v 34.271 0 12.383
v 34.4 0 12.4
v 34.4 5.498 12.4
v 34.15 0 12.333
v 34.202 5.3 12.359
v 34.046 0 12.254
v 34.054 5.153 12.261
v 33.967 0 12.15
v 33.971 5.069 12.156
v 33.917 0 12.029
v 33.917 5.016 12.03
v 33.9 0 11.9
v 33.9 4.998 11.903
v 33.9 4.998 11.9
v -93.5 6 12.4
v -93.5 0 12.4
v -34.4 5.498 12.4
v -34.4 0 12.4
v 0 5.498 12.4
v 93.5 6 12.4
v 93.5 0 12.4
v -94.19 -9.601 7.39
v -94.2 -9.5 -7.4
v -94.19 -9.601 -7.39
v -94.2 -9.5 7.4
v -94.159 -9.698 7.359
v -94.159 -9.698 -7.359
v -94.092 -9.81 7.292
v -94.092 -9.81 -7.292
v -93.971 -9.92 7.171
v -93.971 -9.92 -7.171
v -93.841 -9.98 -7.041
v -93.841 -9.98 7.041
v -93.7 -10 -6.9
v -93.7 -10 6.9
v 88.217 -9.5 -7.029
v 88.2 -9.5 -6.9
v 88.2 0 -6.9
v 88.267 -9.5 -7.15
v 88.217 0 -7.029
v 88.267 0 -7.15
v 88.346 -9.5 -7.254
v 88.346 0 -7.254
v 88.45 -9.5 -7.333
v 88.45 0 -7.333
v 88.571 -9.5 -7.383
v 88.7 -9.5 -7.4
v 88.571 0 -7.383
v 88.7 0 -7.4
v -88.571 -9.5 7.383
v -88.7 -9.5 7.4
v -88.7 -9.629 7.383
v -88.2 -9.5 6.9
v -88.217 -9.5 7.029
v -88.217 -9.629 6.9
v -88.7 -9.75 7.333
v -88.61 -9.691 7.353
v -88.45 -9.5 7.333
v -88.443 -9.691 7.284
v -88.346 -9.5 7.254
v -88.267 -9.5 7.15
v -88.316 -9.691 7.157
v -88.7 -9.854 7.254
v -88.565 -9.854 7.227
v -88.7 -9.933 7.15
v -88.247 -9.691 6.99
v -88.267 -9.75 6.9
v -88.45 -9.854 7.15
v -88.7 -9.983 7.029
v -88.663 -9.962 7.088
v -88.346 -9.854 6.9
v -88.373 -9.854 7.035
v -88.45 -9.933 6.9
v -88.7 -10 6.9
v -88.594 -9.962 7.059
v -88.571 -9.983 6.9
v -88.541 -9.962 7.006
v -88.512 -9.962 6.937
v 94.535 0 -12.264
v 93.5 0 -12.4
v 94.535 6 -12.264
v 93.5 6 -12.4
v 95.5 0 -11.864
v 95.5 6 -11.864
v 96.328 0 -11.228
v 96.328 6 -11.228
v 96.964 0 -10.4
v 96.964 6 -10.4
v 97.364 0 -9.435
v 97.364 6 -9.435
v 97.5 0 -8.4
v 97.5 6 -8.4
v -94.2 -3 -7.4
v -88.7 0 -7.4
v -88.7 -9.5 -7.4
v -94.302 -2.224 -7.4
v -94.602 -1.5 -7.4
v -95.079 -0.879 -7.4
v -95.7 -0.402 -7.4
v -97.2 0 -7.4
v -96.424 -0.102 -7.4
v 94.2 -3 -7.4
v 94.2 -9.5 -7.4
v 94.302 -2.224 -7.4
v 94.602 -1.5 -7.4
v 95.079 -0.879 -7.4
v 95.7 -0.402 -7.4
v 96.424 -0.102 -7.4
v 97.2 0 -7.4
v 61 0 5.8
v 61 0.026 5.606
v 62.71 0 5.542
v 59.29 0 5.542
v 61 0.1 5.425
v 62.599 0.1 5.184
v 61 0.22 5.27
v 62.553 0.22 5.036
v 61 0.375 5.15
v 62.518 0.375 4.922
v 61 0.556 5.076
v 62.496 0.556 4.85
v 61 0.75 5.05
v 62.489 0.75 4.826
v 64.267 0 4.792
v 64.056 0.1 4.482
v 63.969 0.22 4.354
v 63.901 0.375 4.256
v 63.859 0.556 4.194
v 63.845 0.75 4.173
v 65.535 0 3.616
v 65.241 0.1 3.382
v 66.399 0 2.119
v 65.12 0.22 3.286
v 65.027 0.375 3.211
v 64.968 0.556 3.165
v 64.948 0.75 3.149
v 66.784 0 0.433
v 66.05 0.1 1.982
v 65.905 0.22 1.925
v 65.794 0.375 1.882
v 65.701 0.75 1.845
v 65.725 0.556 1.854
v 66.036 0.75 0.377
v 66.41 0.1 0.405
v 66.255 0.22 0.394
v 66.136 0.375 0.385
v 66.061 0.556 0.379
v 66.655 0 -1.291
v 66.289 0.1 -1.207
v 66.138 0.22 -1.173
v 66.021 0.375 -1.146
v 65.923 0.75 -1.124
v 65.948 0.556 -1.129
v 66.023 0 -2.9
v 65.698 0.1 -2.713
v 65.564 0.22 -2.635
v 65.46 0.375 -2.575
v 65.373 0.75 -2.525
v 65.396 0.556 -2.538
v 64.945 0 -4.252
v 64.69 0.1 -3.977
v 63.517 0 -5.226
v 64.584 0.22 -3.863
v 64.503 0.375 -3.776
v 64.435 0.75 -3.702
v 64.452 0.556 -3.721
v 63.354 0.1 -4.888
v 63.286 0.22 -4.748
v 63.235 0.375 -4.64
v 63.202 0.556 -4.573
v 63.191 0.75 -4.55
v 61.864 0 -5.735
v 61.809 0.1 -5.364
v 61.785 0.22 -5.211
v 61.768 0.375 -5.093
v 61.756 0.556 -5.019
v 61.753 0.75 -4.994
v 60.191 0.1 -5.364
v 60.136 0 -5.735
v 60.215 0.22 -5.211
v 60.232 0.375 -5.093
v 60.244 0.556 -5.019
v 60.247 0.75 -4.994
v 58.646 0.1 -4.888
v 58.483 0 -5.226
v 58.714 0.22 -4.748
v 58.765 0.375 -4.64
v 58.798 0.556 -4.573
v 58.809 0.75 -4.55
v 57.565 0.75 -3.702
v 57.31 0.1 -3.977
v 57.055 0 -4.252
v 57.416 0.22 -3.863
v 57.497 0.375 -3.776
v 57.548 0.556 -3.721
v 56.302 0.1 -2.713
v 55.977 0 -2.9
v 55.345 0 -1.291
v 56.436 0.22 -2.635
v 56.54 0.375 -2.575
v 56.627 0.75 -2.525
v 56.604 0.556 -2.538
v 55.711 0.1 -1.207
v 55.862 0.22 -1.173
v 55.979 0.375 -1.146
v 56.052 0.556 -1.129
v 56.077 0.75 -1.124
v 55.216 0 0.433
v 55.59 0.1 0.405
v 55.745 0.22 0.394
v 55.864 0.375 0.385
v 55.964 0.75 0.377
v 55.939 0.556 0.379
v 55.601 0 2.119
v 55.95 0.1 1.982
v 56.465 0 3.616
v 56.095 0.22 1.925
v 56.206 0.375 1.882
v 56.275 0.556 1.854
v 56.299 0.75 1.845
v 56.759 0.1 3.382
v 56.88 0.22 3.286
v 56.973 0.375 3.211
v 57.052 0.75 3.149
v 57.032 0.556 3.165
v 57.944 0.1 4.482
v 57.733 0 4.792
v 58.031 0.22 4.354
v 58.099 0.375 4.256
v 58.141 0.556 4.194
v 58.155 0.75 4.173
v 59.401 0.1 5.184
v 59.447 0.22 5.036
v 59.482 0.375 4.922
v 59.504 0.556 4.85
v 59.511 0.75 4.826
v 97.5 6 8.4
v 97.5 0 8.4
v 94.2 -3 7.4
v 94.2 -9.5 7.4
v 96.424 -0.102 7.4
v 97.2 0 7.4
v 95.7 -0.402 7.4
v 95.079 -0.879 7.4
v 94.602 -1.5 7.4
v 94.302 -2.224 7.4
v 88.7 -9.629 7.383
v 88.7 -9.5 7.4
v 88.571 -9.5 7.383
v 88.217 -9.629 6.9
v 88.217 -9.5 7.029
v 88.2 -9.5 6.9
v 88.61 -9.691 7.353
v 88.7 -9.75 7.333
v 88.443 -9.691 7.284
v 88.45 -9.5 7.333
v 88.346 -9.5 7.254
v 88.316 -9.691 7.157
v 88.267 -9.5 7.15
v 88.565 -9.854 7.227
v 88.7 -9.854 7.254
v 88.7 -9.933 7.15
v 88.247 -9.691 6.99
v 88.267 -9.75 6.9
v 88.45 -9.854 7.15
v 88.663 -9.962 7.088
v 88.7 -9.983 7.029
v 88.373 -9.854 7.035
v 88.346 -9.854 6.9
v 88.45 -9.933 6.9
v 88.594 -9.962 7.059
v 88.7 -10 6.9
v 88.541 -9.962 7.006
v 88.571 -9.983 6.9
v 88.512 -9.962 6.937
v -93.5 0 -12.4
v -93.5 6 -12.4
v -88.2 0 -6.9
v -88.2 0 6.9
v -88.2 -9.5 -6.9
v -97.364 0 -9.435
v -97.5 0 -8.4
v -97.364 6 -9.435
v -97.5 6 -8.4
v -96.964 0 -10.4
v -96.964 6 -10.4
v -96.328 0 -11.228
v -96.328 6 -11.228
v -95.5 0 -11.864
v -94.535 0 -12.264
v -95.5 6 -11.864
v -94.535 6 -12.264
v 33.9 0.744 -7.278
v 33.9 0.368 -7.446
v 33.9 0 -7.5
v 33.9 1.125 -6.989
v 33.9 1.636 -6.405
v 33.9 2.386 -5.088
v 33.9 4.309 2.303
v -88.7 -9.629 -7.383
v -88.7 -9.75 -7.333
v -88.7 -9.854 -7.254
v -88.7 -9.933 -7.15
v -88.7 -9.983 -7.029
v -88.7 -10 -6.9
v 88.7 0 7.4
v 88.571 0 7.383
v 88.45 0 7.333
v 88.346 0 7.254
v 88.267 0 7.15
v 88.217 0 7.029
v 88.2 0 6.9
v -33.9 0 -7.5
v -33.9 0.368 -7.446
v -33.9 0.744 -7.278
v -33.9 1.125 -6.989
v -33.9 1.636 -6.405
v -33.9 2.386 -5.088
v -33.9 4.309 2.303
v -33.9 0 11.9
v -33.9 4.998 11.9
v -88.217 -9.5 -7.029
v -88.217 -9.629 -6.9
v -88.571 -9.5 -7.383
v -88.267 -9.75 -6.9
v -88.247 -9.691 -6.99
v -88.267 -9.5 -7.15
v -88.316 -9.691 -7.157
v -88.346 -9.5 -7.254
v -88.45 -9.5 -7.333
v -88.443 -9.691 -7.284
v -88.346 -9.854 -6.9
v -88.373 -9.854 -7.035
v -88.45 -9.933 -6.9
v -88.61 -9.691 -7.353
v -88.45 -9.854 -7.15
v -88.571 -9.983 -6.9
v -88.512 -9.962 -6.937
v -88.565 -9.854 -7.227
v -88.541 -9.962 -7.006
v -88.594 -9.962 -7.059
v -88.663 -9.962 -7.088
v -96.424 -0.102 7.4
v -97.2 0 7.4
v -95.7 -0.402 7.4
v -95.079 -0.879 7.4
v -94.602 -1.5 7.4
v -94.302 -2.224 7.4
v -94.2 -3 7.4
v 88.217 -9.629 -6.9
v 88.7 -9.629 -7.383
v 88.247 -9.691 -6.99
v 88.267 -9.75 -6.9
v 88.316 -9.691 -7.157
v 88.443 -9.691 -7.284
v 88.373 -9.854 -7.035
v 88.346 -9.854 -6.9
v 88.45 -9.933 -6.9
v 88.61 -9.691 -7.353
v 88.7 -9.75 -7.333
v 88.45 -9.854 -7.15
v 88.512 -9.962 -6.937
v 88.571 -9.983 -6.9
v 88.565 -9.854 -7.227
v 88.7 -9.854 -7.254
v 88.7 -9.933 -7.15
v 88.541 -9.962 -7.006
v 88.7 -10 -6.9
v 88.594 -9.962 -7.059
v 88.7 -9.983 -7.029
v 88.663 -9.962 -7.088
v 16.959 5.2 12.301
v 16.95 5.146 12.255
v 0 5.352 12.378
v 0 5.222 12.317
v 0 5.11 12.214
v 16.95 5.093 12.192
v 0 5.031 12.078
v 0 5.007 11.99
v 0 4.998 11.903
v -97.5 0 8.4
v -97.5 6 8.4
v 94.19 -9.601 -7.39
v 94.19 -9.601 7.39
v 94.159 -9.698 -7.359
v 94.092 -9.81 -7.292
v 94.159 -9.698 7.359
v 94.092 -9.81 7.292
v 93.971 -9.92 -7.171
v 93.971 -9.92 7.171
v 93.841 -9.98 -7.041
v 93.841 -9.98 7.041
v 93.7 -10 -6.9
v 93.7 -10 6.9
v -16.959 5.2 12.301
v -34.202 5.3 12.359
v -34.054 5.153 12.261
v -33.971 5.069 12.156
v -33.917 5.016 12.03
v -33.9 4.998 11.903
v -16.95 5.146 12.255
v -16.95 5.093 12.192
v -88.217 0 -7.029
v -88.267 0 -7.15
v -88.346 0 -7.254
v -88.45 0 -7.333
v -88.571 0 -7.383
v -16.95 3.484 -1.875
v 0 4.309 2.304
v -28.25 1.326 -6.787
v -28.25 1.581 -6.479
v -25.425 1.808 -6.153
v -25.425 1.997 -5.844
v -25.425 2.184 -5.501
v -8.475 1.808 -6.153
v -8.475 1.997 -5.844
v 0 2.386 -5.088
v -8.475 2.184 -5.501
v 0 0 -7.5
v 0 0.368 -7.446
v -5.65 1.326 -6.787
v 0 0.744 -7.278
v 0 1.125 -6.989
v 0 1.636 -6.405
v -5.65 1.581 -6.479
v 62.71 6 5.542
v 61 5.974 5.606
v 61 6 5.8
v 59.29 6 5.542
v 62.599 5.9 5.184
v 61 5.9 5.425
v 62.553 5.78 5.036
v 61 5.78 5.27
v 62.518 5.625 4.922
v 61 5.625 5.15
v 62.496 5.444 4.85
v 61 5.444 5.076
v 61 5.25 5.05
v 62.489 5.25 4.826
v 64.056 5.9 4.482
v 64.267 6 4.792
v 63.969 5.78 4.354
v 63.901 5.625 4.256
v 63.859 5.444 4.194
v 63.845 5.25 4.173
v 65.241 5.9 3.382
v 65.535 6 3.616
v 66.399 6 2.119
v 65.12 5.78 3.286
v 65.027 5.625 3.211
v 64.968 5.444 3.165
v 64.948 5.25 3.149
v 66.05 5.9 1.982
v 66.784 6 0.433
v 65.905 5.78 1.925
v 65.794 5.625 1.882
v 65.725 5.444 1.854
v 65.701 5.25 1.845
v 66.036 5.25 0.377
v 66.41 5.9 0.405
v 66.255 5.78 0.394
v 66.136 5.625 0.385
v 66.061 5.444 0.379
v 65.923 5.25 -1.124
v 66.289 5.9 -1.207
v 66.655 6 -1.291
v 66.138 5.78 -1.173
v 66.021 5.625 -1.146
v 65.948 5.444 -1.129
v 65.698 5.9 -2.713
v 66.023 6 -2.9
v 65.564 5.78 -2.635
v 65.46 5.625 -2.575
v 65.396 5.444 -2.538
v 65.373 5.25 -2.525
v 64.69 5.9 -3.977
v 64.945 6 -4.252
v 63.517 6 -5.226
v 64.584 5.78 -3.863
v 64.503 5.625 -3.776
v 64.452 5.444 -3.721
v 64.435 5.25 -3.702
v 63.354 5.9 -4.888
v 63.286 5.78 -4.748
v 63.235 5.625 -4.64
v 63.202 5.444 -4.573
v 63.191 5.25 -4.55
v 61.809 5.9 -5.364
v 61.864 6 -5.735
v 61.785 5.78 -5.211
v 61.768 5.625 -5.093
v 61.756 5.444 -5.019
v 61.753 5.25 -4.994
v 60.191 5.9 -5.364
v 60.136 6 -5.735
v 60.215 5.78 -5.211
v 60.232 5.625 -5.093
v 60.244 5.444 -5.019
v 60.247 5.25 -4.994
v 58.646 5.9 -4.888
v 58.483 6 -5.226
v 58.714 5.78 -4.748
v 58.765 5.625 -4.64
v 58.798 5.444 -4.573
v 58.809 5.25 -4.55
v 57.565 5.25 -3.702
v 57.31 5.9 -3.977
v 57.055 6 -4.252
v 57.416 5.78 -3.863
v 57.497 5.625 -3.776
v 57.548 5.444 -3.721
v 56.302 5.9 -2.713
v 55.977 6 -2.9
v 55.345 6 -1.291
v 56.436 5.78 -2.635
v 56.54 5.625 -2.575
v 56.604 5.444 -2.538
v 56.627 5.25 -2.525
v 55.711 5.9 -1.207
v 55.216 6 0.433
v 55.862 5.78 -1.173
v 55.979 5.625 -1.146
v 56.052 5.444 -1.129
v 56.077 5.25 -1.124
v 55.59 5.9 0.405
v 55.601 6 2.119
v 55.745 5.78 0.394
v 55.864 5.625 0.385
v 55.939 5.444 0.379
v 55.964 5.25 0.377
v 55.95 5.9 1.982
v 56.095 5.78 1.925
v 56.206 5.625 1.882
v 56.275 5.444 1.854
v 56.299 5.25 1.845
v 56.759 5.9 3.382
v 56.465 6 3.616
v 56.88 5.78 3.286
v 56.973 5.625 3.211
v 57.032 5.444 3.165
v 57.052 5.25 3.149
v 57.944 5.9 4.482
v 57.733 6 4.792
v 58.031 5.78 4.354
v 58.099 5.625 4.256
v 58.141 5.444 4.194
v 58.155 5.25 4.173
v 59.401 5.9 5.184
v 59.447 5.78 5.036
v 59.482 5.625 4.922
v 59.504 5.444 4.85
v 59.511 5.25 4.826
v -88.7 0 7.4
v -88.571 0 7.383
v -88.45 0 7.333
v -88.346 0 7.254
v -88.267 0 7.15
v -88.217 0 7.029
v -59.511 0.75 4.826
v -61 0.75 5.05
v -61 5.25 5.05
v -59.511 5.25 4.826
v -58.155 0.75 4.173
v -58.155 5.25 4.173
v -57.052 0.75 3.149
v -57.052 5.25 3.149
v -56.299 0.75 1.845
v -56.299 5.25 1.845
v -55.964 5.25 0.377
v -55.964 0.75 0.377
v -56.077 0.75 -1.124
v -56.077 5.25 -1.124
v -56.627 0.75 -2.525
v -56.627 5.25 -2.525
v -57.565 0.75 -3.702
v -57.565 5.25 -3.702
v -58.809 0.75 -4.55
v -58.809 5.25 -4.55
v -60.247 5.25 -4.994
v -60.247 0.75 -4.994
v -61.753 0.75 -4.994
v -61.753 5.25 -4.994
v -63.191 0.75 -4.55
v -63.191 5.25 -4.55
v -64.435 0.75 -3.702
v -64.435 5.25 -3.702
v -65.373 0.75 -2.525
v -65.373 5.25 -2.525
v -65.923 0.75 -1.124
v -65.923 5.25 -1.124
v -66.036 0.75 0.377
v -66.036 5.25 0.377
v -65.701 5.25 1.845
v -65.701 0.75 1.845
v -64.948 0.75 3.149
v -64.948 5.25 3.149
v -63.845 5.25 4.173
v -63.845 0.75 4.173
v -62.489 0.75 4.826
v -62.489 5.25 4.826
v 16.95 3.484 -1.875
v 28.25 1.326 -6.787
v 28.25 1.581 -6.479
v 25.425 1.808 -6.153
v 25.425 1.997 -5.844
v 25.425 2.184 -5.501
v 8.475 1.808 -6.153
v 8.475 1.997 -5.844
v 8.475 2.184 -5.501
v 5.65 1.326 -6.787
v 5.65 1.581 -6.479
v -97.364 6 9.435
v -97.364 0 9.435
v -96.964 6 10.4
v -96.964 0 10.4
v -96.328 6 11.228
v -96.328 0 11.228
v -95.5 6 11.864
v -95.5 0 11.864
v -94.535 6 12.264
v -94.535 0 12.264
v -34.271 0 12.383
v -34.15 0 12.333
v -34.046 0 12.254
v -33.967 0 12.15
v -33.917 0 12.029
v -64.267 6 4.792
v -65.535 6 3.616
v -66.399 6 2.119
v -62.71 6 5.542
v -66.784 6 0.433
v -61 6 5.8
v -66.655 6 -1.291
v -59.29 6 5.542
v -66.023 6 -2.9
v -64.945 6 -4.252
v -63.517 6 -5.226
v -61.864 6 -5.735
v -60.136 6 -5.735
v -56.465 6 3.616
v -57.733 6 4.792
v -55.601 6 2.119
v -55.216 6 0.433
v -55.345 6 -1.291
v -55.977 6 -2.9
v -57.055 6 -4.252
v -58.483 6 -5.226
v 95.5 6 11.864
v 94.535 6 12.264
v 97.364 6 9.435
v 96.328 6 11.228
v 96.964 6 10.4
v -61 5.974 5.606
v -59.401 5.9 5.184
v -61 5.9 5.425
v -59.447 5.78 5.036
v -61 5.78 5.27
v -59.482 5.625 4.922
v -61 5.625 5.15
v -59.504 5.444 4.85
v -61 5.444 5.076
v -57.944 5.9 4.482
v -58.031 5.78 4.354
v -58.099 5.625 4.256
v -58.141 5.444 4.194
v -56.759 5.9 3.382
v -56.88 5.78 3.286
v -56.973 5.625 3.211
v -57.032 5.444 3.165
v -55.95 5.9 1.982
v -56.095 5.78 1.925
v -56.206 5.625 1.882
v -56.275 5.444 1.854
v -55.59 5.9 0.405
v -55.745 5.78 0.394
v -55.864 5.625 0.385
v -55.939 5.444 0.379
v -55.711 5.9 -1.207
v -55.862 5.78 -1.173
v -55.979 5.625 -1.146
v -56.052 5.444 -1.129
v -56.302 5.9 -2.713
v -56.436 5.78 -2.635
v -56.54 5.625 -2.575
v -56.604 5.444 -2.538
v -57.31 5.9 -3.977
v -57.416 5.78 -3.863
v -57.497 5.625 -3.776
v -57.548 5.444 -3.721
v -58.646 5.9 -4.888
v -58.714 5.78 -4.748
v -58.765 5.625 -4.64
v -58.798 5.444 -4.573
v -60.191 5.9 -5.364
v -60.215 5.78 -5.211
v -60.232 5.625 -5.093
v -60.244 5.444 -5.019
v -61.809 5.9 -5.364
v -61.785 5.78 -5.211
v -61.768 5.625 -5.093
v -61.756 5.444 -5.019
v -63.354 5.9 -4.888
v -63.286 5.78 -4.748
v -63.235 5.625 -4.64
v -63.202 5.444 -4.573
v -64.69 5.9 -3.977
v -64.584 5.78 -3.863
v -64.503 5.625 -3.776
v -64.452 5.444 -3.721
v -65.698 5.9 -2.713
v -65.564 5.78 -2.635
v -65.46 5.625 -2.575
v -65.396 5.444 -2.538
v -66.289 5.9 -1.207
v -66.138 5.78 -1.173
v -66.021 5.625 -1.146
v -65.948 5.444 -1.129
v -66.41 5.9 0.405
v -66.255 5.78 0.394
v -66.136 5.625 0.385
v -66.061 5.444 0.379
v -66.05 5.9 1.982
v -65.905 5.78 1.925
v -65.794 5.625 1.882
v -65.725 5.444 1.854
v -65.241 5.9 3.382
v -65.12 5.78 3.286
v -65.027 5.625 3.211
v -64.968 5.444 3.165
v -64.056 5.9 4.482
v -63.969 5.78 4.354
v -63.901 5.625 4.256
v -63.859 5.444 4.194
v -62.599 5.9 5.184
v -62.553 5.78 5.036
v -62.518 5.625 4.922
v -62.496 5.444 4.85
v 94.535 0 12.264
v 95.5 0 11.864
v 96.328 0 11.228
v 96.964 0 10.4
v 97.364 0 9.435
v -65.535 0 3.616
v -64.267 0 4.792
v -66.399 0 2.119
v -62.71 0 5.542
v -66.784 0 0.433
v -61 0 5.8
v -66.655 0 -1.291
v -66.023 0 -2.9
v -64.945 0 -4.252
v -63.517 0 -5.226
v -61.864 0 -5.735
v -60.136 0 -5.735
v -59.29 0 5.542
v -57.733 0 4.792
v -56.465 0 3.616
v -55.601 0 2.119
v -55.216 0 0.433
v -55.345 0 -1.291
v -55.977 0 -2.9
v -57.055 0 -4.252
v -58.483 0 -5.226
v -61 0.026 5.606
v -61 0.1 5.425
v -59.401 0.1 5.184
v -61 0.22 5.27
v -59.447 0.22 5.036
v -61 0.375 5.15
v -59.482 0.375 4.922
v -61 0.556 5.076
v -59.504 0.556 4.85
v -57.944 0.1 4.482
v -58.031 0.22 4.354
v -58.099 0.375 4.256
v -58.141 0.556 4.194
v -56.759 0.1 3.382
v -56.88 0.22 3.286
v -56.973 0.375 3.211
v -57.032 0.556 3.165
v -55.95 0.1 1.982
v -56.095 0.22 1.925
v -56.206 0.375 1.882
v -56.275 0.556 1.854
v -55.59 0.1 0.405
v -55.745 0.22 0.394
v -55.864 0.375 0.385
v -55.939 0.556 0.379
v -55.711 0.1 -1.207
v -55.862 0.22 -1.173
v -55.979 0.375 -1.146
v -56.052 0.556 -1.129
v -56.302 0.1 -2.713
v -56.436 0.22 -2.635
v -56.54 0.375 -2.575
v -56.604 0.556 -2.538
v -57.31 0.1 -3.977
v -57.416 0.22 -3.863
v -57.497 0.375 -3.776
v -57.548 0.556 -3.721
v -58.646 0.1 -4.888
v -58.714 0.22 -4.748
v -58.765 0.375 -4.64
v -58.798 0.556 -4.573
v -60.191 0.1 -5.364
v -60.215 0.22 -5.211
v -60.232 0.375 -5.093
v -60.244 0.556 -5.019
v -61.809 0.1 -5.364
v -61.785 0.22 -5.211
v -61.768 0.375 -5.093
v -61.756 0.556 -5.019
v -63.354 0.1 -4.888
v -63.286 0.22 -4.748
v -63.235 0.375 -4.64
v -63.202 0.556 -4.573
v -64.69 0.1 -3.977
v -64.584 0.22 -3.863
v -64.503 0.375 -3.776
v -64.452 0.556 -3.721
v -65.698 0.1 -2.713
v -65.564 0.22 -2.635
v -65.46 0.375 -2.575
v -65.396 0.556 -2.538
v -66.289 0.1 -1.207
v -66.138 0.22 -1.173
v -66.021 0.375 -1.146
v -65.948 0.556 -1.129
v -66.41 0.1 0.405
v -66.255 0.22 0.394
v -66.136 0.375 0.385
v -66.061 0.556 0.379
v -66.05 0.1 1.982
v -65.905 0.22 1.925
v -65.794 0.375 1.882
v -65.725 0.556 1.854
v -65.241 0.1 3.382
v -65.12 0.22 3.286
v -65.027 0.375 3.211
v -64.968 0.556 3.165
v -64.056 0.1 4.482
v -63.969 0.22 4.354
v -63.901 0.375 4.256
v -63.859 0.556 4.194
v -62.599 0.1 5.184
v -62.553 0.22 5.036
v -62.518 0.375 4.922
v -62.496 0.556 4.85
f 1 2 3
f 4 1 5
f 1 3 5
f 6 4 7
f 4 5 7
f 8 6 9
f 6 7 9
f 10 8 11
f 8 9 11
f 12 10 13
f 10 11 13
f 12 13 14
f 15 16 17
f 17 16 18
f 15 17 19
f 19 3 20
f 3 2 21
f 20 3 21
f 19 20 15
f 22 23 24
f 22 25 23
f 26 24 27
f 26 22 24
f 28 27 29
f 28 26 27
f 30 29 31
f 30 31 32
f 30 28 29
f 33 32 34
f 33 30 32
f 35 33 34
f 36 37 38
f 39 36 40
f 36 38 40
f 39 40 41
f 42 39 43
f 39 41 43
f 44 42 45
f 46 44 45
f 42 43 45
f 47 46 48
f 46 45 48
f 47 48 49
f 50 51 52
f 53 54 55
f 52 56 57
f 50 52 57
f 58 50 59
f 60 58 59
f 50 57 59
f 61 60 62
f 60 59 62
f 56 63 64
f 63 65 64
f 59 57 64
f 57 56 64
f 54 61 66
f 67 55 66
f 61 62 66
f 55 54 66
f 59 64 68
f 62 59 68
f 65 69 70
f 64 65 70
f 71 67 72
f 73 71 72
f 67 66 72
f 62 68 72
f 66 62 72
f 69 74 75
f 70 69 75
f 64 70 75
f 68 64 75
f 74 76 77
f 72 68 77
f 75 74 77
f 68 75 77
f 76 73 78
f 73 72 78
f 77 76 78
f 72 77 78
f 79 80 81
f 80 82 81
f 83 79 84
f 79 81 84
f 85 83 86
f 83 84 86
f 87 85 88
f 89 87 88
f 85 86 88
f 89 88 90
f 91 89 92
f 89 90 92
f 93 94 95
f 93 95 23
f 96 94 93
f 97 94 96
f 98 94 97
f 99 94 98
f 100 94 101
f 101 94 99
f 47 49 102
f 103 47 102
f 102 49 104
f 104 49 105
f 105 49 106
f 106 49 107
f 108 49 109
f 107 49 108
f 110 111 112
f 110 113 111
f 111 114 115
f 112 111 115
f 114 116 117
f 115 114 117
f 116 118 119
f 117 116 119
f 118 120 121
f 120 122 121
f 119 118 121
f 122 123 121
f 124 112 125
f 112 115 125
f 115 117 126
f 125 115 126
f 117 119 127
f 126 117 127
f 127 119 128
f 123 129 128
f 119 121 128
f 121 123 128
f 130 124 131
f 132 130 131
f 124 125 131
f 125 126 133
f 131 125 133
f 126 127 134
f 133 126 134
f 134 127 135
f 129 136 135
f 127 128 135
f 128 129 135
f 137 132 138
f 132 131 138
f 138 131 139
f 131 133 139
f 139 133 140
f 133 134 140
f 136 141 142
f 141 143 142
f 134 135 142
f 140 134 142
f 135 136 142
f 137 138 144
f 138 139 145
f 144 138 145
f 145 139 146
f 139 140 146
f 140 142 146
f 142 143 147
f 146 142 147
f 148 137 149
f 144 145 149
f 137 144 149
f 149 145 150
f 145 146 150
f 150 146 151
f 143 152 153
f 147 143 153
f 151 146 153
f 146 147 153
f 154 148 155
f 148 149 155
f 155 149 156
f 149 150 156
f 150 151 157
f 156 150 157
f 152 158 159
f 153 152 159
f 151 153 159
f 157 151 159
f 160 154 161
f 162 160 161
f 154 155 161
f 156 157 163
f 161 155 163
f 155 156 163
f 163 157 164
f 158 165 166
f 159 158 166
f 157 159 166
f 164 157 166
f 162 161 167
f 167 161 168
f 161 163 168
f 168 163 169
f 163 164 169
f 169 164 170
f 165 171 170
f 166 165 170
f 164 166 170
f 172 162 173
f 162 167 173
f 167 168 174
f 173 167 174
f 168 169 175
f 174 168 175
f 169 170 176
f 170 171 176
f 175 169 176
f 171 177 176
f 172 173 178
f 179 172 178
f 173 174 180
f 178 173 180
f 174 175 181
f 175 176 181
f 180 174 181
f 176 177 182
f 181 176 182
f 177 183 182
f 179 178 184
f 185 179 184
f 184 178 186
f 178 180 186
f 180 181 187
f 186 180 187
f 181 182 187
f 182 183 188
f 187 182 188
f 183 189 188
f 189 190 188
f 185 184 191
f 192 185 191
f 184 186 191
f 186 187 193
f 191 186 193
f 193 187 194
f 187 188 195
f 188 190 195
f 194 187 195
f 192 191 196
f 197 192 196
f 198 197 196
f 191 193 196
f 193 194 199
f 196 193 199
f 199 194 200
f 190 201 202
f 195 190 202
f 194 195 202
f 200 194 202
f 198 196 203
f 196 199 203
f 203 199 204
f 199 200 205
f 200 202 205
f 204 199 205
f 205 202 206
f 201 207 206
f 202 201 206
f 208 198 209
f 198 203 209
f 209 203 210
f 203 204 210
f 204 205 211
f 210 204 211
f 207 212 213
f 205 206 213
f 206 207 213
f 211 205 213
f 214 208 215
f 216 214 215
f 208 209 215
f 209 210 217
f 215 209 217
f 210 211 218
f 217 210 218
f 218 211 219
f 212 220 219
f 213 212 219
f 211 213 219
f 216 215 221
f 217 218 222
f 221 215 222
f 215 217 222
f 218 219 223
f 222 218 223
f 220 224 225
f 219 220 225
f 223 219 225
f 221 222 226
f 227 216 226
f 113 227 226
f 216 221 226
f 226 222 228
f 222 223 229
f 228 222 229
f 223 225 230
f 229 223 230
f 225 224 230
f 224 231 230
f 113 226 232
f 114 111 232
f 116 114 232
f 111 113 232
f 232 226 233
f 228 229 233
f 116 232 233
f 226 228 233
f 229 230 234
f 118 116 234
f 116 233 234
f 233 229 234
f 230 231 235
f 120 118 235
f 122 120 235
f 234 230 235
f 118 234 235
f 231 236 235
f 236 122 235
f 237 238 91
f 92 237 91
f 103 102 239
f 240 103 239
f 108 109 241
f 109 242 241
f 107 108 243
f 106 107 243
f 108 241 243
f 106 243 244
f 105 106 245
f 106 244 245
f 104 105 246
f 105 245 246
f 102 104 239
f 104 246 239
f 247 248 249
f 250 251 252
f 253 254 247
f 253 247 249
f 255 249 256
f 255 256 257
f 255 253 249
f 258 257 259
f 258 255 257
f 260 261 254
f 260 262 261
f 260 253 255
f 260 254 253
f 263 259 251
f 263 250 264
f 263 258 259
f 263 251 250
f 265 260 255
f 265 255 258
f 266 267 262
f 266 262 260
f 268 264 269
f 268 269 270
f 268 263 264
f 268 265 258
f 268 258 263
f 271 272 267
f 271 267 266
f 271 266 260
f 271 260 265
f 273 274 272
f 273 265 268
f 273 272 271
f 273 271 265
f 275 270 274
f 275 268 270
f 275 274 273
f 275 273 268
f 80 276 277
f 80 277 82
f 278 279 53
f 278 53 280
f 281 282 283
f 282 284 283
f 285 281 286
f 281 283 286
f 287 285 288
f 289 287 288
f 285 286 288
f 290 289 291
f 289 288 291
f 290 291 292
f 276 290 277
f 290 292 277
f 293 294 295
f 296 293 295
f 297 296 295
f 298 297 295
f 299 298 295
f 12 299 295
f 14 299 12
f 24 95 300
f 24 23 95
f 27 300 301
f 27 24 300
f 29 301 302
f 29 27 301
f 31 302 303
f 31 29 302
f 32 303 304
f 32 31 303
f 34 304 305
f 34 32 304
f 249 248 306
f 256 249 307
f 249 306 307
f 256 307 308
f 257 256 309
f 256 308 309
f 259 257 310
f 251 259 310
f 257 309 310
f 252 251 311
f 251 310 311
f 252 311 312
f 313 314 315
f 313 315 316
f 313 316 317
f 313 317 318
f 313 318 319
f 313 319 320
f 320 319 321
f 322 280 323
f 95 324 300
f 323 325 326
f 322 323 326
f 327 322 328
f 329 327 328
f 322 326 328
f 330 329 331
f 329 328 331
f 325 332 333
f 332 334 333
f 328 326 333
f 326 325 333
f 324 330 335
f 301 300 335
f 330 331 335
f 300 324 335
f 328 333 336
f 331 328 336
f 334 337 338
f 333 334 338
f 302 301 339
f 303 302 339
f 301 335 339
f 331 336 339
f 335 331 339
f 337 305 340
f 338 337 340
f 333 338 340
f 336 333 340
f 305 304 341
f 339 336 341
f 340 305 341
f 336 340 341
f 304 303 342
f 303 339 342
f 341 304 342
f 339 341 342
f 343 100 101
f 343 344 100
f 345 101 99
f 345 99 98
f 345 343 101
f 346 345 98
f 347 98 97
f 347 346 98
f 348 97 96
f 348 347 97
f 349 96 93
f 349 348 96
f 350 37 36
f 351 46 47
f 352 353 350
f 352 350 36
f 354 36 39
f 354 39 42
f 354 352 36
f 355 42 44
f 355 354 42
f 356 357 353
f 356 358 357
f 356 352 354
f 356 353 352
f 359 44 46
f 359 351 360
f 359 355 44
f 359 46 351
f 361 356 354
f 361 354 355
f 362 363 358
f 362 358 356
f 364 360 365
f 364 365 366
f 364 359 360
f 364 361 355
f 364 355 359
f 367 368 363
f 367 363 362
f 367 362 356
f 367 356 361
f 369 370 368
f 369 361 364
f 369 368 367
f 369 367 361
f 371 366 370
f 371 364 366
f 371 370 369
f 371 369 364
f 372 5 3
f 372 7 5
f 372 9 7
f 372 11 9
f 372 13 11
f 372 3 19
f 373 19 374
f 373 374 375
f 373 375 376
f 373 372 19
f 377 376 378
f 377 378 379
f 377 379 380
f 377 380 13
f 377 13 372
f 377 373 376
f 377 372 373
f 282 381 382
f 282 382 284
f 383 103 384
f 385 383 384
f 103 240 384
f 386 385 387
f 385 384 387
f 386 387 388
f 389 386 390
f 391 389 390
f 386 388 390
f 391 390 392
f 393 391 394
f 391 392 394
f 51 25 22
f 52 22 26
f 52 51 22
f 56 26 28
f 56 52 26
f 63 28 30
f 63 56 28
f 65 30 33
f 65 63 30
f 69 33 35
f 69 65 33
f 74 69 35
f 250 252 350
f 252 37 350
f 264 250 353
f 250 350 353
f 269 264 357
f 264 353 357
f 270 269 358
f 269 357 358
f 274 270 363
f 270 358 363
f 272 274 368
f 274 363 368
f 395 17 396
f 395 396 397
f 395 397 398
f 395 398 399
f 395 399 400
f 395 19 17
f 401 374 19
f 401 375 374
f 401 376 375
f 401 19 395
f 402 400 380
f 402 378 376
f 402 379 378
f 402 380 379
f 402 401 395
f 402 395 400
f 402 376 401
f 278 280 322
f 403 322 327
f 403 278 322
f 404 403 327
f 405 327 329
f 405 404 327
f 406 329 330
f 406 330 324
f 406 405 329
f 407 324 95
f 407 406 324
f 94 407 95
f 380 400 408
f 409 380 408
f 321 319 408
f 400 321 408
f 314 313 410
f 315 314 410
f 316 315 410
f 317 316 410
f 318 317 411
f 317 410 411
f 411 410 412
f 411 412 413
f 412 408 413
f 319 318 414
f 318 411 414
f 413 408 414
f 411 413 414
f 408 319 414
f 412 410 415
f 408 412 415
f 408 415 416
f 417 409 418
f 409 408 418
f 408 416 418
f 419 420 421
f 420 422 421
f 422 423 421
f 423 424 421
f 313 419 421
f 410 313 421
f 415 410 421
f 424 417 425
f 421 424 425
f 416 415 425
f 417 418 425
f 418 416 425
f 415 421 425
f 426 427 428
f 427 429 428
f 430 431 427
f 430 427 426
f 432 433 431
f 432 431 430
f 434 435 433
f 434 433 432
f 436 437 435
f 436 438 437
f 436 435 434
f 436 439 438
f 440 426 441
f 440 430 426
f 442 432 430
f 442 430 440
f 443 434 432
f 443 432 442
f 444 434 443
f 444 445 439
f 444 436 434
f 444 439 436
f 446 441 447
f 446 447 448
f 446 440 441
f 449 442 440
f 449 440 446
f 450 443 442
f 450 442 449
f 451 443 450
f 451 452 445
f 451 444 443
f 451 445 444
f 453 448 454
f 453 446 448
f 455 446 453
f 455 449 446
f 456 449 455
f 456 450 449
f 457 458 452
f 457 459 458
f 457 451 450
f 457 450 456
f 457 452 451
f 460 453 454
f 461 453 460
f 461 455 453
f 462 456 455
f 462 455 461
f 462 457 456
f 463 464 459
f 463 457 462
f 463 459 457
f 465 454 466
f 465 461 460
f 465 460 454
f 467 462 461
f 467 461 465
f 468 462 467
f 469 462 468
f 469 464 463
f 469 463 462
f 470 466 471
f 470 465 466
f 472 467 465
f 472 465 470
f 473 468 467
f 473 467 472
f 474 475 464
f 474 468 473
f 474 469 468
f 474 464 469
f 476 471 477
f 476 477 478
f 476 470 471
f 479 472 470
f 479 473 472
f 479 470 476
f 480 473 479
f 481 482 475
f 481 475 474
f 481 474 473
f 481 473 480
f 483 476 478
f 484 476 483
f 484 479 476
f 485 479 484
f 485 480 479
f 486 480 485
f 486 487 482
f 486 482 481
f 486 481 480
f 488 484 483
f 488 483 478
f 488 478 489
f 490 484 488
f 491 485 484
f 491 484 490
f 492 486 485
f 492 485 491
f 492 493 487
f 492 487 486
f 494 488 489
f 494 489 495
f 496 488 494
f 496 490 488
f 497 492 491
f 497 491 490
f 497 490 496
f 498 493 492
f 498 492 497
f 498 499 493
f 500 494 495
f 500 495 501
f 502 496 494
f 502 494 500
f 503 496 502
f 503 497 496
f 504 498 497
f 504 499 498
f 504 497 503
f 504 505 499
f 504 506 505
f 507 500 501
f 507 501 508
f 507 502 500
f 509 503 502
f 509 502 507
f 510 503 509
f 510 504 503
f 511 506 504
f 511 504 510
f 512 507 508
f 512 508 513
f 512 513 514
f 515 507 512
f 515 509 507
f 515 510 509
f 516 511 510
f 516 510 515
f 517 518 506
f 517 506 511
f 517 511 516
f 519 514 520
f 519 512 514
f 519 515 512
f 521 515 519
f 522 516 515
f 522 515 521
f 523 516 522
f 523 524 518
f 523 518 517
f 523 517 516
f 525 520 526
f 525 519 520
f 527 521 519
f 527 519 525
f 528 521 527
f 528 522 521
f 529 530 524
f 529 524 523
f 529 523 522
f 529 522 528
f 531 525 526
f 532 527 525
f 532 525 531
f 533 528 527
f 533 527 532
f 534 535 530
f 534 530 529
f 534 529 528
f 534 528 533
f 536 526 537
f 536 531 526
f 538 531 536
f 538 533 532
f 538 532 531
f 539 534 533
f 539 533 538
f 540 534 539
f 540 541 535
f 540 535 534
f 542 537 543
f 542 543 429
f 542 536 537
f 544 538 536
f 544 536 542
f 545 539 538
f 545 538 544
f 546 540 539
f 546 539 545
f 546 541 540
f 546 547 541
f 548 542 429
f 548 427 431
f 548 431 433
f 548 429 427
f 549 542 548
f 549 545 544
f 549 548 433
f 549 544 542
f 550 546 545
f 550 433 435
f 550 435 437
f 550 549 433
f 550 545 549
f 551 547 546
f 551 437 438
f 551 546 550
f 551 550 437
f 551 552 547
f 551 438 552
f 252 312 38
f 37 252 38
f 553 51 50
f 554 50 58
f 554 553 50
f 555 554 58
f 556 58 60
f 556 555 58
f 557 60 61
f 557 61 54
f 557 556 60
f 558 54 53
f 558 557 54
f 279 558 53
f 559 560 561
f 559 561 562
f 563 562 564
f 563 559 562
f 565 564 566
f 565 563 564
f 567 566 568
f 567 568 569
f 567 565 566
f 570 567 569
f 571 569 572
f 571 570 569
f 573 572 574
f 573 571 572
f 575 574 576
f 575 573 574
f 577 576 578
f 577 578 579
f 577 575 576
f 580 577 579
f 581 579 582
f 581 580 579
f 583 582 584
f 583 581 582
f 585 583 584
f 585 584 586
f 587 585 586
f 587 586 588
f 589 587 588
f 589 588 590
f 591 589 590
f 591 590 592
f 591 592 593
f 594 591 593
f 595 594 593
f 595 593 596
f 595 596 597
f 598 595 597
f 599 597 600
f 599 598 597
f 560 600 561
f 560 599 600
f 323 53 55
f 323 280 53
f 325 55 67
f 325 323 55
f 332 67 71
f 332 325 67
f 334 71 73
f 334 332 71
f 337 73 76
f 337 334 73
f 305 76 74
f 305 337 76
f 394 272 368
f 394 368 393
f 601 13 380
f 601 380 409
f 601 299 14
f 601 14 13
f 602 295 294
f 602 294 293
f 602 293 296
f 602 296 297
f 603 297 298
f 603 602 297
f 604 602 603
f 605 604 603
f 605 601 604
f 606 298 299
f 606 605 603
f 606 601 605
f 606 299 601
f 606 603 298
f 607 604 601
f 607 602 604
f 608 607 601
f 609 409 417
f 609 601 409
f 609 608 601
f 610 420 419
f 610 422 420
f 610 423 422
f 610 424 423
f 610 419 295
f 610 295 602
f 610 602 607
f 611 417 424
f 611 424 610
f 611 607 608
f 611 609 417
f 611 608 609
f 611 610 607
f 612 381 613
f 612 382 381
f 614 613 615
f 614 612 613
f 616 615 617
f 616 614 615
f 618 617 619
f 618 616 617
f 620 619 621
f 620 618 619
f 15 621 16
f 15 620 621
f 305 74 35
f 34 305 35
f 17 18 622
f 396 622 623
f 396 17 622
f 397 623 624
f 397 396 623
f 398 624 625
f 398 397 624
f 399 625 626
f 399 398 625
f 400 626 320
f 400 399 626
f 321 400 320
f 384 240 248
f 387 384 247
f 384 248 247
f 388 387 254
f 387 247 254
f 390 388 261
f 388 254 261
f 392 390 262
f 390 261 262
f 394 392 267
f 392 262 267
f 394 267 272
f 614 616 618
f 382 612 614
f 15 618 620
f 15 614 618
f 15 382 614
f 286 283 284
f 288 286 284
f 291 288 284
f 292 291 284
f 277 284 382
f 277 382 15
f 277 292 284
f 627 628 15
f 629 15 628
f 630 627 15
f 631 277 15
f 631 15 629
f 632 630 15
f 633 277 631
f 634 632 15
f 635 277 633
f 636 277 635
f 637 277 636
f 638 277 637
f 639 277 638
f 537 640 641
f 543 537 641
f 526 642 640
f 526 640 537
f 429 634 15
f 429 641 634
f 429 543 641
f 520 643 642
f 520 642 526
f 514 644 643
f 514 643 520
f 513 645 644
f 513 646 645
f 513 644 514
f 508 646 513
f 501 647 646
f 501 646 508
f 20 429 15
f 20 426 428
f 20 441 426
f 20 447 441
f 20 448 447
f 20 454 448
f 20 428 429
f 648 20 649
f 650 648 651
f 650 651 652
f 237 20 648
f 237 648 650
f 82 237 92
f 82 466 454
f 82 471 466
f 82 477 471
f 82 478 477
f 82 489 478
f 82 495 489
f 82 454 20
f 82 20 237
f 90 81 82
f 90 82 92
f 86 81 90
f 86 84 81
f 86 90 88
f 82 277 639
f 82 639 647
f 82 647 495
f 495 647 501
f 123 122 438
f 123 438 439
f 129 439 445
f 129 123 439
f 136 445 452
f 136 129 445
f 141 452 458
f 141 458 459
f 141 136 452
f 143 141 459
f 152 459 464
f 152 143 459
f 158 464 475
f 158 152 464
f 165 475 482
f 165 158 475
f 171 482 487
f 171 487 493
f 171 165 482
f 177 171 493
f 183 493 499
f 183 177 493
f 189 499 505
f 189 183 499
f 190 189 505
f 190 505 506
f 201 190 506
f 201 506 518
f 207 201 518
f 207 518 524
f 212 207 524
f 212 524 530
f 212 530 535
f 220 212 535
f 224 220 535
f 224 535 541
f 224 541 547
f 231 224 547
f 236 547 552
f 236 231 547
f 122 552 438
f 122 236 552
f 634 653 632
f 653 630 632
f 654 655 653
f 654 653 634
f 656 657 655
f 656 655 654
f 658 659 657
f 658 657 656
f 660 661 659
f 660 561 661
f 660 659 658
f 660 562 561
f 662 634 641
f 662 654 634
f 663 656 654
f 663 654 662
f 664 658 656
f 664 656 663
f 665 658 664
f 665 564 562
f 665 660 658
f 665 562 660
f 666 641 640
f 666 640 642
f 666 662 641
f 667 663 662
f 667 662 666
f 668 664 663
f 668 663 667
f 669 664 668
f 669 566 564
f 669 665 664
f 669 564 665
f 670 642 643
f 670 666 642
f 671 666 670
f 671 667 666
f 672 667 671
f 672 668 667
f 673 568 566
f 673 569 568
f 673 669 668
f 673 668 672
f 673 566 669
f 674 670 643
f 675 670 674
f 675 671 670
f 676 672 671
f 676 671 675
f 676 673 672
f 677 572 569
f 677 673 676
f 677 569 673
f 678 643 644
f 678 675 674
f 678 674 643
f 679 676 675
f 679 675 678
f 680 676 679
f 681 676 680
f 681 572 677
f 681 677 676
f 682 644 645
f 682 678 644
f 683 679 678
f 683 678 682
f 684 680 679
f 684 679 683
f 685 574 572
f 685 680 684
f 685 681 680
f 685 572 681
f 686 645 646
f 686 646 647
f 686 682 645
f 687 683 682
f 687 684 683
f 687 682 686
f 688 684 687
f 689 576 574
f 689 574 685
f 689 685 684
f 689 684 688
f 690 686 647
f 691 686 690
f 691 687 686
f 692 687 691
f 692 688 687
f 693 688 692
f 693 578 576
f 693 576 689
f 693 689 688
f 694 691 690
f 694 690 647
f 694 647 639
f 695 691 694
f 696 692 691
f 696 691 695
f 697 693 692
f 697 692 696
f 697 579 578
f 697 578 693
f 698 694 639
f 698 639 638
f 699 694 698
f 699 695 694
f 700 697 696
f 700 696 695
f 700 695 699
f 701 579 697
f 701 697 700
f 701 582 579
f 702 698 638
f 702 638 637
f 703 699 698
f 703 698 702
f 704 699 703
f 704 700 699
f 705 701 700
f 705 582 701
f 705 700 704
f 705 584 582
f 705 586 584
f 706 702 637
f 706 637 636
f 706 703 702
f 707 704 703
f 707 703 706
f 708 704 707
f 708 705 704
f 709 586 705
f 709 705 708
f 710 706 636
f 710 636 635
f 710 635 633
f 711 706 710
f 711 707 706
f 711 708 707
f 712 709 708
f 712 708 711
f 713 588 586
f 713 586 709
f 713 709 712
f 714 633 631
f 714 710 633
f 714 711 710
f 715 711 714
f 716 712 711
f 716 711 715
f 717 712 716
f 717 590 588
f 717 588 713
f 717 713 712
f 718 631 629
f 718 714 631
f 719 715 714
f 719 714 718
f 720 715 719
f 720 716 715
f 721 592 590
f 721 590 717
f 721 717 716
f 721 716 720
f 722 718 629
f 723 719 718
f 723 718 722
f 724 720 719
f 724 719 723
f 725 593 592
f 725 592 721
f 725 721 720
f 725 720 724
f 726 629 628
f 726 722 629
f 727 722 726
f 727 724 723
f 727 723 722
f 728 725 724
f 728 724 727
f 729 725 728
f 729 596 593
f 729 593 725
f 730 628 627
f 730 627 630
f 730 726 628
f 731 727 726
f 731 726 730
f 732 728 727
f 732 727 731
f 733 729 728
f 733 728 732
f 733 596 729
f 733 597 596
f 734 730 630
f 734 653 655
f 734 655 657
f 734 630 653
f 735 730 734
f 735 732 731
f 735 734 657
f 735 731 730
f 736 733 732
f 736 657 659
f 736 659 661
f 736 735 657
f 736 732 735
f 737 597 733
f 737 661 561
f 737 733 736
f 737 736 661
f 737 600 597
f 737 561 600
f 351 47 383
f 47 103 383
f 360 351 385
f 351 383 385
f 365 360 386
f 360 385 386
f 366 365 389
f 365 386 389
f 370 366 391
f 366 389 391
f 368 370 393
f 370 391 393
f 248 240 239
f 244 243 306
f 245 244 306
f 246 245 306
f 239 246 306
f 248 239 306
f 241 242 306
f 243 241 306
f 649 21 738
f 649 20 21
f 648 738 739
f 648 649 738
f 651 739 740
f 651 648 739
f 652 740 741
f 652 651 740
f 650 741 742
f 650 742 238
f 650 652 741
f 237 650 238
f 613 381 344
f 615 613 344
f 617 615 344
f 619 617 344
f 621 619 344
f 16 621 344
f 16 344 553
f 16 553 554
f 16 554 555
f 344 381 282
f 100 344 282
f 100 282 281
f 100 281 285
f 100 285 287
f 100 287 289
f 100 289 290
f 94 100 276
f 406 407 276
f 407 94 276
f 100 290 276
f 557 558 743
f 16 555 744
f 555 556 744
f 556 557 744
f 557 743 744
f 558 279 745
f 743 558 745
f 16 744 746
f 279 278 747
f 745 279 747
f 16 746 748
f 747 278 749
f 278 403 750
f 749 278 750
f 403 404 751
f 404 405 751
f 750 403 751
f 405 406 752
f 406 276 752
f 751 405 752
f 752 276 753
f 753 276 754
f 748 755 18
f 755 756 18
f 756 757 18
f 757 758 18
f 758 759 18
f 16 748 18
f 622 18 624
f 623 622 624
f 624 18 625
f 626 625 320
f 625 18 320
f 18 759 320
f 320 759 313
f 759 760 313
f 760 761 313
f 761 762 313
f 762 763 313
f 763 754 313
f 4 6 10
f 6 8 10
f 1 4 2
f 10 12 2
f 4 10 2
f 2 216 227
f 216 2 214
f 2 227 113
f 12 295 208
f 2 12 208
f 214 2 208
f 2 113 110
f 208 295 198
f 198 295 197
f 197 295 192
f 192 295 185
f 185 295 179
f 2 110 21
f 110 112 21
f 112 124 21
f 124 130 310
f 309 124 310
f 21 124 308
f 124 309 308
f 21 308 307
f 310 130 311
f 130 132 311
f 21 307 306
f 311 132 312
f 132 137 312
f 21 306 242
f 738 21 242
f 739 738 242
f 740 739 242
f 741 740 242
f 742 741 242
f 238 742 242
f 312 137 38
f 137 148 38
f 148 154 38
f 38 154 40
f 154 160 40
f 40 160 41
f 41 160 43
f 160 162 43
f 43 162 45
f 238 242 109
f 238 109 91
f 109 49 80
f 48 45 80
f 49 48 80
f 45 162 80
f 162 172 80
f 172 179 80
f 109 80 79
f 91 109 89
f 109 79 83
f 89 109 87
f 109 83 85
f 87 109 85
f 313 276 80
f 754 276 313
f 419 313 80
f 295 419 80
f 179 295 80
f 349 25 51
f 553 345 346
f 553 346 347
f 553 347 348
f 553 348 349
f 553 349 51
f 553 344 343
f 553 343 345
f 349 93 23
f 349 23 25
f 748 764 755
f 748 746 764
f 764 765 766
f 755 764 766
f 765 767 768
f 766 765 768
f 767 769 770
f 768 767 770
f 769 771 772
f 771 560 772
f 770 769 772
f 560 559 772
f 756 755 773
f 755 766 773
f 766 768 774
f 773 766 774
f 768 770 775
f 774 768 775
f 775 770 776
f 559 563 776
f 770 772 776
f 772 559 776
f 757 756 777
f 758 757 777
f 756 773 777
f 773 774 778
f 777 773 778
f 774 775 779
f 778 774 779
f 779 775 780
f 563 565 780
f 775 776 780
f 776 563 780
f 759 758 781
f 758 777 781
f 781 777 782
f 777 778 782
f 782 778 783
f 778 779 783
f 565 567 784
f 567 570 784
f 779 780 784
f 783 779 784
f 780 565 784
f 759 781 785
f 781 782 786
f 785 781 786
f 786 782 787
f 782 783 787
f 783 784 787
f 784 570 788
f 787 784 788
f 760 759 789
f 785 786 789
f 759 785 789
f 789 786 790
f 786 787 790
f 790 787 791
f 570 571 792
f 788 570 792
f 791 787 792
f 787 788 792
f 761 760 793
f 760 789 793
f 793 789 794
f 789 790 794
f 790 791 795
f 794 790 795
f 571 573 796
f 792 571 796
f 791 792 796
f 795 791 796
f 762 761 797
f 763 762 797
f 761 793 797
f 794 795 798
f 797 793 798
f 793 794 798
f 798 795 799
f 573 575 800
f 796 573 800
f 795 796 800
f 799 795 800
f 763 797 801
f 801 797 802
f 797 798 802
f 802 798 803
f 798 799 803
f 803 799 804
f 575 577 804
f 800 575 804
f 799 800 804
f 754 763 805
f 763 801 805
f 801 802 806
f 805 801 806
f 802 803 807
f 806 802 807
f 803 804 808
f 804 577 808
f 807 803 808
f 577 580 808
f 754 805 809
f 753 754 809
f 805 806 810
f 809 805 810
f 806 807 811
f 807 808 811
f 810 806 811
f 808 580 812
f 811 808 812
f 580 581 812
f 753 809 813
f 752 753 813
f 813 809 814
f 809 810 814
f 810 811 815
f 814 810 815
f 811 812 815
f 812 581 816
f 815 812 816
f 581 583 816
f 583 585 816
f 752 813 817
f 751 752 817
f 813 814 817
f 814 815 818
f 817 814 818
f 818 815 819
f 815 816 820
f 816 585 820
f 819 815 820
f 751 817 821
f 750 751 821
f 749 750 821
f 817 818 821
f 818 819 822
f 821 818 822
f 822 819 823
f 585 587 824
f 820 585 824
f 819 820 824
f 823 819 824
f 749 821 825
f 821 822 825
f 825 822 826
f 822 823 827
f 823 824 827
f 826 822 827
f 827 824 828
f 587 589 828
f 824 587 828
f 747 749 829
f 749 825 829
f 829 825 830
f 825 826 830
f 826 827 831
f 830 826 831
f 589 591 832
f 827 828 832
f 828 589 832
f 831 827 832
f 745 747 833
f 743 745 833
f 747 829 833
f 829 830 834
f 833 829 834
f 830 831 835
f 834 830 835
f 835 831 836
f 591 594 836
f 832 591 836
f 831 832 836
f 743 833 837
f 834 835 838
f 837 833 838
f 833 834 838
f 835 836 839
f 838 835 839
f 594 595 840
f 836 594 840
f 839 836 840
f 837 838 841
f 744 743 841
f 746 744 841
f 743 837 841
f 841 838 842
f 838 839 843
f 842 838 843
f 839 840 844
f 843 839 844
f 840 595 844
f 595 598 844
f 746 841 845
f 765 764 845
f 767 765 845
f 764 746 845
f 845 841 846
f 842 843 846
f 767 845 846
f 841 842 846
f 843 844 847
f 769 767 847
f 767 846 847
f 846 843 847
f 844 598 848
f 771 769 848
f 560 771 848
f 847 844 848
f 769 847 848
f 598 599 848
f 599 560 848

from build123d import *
from OCP.BRepFilletAPI import BRepFilletAPI_MakeFillet

# Parameters (mm, degrees)
SKETCH1_W             = 195
SKETCH1_H             = 24.8
SKETCH1_R             = 5.05
BOSS_EXTRUDE1_DEPTH   = 6
CUT_EXTRUDE1_DEPTH    = 33.9
FILLET1_R1            = 0.75
FILLET1_R2            = 4
FILLET1_R3            = 0.5
BOSS_EXTRUDE2_DEPTH   = 10
FILLET2_R1            = 3
FILLET2_R2            = 0.5
FILLET2_OF_MIRROR1_R1 = 3
FILLET2_OF_MIRROR1_R2 = 0.5


with BuildPart() as part:
    # Sketch1 → Boss-Extrude1 (new body)
    with BuildSketch(Plane(origin=(0, 0, 0), x_dir=(1, 0, 0), z_dir=(0, 1, 0))):
        Rectangle(SKETCH1_W, SKETCH1_H)
        with Locations(Location((-61, 0, 0), (0, 0, 270))):
            Circle(SKETCH1_R, mode=Mode.SUBTRACT)
        with Locations(Location((61, 0, 0), (0, 0, 270))):
            Circle(SKETCH1_R, mode=Mode.SUBTRACT)
    extrude(amount=BOSS_EXTRUDE1_DEPTH)

    # Sketch2 → Cut-Extrude1 (cut, symmetric)
    with BuildSketch(Plane(origin=(0, 0, 0), x_dir=(0, 0, -1), z_dir=(1, 0, 0))):
        with BuildLine():
            Line((-12.4, 0), (-12.4, 5))
            add(Edge.make_bspline(
                [(7.5, 0), (7.5, 5), (-12.4, 5)],
                knots=[3.141592654, 3.141592654, 3.141592654, 4.71238898, 4.71238898, 4.71238898], degree=2, weights=[1, 0.707106781, 1]))
            Line((7.5, 0), (-12.4, 0))
        make_face()
    extrude(amount=CUT_EXTRUDE1_DEPTH, both=True, mode=Mode.SUBTRACT)

    # Fillet1: one fillet with a radius per group of edges: ONE call of the kernel's fillet builder (fillet() takes one radius for all edges)
    fillet1_edges_1 = [part.edges().sort_by_distance(p)[0] for p in [
        (-61, 0, -5.05),
        (-61, 6, -5.05),
        (61, 0, -5.05),
        (61, 6, -5.05),
    ]]
    fillet1_edges_2 = [part.edges().sort_by_distance(p)[0] for p in [
        (97.5, 3, 12.4),
        (-97.5, 3, 12.4),
        (-97.5, 3, -12.4),
        (97.5, 3, -12.4),
    ]]
    fillet1_edges_3 = [part.edges().sort_by_distance(p)[0] for p in [
        (-33.9, 2.5, 12.4),
        (16.95, 5, 12.4),
        (33.9, 2.5, 12.4),
    ]]
    fillet1 = BRepFilletAPI_MakeFillet(part.part.solid().wrapped)
    for e in fillet1_edges_1:
        fillet1.Add(FILLET1_R1, e.wrapped)
    for e in fillet1_edges_2:
        fillet1.Add(FILLET1_R2, e.wrapped)
    for e in fillet1_edges_3:
        fillet1.Add(FILLET1_R3, e.wrapped)
    add(Compound.cast(fillet1.Shape()), mode=Mode.REPLACE)

    # Sketch3 → Boss-Extrude2 (add)
    with BuildSketch(Plane.XZ):
        with BuildLine():
            Line((88.7, -7.4), (94.2, -7.4))
            Line((94.2, -7.4), (94.2, 7.4))
            Line((94.2, 7.4), (88.7, 7.4))
            ThreePointArc((88.7, 7.4), (88.346446609, 7.253553391), (88.2, 6.9))
            Line((88.2, 6.9), (88.2, -6.9))
            ThreePointArc((88.2, -6.9), (88.346446609, -7.253553391), (88.7, -7.4))
        make_face()
    boss_extrude2 = extrude(amount=BOSS_EXTRUDE2_DEPTH)

    # Fillet2: one fillet with a radius per group of edges: ONE call of the kernel's fillet builder (fillet() takes one radius for all edges)
    fillet2_edges_1 = [part.edges().sort_by_distance(p)[0] for p in [
        (94.2, 0, 0),
    ]]
    fillet2_edges_2 = [part.edges().sort_by_distance(p)[0] for p in [
        (91.45, -10, -7.4),
        (94.2, -10, 0),
    ]]
    fillet2 = BRepFilletAPI_MakeFillet(part.part.solid().wrapped)
    for e in fillet2_edges_1:
        fillet2.Add(FILLET2_R1, e.wrapped)
    for e in fillet2_edges_2:
        fillet2.Add(FILLET2_R2, e.wrapped)
    add(Compound.cast(fillet2.Shape()), mode=Mode.REPLACE)

    # Mirror1: Boss-Extrude2 across plane
    add(boss_extrude2.mirror(Plane(origin=(0, 0, 0), x_dir=(0, 0, 1), z_dir=(1, 0, 0))))

    # Fillet2 of Mirror1: one fillet with a radius per group of edges: ONE call of the kernel's fillet builder (fillet() takes one radius for all edges)
    fillet2_of_mirror1_edges_1 = [part.edges().sort_by_distance(p)[0] for p in [
        (-94.2, 0, 0),
    ]]
    fillet2_of_mirror1_edges_2 = [part.edges().sort_by_distance(p)[0] for p in [
        (-91.45, -10, -7.4),
        (-94.2, -10, 0),
    ]]
    fillet2_of_mirror1 = BRepFilletAPI_MakeFillet(part.part.solid().wrapped)
    for e in fillet2_of_mirror1_edges_1:
        fillet2_of_mirror1.Add(FILLET2_OF_MIRROR1_R1, e.wrapped)
    for e in fillet2_of_mirror1_edges_2:
        fillet2_of_mirror1.Add(FILLET2_OF_MIRROR1_R2, e.wrapped)
    add(Compound.cast(fillet2_of_mirror1.Shape()), mode=Mode.REPLACE)


solid = part.part
